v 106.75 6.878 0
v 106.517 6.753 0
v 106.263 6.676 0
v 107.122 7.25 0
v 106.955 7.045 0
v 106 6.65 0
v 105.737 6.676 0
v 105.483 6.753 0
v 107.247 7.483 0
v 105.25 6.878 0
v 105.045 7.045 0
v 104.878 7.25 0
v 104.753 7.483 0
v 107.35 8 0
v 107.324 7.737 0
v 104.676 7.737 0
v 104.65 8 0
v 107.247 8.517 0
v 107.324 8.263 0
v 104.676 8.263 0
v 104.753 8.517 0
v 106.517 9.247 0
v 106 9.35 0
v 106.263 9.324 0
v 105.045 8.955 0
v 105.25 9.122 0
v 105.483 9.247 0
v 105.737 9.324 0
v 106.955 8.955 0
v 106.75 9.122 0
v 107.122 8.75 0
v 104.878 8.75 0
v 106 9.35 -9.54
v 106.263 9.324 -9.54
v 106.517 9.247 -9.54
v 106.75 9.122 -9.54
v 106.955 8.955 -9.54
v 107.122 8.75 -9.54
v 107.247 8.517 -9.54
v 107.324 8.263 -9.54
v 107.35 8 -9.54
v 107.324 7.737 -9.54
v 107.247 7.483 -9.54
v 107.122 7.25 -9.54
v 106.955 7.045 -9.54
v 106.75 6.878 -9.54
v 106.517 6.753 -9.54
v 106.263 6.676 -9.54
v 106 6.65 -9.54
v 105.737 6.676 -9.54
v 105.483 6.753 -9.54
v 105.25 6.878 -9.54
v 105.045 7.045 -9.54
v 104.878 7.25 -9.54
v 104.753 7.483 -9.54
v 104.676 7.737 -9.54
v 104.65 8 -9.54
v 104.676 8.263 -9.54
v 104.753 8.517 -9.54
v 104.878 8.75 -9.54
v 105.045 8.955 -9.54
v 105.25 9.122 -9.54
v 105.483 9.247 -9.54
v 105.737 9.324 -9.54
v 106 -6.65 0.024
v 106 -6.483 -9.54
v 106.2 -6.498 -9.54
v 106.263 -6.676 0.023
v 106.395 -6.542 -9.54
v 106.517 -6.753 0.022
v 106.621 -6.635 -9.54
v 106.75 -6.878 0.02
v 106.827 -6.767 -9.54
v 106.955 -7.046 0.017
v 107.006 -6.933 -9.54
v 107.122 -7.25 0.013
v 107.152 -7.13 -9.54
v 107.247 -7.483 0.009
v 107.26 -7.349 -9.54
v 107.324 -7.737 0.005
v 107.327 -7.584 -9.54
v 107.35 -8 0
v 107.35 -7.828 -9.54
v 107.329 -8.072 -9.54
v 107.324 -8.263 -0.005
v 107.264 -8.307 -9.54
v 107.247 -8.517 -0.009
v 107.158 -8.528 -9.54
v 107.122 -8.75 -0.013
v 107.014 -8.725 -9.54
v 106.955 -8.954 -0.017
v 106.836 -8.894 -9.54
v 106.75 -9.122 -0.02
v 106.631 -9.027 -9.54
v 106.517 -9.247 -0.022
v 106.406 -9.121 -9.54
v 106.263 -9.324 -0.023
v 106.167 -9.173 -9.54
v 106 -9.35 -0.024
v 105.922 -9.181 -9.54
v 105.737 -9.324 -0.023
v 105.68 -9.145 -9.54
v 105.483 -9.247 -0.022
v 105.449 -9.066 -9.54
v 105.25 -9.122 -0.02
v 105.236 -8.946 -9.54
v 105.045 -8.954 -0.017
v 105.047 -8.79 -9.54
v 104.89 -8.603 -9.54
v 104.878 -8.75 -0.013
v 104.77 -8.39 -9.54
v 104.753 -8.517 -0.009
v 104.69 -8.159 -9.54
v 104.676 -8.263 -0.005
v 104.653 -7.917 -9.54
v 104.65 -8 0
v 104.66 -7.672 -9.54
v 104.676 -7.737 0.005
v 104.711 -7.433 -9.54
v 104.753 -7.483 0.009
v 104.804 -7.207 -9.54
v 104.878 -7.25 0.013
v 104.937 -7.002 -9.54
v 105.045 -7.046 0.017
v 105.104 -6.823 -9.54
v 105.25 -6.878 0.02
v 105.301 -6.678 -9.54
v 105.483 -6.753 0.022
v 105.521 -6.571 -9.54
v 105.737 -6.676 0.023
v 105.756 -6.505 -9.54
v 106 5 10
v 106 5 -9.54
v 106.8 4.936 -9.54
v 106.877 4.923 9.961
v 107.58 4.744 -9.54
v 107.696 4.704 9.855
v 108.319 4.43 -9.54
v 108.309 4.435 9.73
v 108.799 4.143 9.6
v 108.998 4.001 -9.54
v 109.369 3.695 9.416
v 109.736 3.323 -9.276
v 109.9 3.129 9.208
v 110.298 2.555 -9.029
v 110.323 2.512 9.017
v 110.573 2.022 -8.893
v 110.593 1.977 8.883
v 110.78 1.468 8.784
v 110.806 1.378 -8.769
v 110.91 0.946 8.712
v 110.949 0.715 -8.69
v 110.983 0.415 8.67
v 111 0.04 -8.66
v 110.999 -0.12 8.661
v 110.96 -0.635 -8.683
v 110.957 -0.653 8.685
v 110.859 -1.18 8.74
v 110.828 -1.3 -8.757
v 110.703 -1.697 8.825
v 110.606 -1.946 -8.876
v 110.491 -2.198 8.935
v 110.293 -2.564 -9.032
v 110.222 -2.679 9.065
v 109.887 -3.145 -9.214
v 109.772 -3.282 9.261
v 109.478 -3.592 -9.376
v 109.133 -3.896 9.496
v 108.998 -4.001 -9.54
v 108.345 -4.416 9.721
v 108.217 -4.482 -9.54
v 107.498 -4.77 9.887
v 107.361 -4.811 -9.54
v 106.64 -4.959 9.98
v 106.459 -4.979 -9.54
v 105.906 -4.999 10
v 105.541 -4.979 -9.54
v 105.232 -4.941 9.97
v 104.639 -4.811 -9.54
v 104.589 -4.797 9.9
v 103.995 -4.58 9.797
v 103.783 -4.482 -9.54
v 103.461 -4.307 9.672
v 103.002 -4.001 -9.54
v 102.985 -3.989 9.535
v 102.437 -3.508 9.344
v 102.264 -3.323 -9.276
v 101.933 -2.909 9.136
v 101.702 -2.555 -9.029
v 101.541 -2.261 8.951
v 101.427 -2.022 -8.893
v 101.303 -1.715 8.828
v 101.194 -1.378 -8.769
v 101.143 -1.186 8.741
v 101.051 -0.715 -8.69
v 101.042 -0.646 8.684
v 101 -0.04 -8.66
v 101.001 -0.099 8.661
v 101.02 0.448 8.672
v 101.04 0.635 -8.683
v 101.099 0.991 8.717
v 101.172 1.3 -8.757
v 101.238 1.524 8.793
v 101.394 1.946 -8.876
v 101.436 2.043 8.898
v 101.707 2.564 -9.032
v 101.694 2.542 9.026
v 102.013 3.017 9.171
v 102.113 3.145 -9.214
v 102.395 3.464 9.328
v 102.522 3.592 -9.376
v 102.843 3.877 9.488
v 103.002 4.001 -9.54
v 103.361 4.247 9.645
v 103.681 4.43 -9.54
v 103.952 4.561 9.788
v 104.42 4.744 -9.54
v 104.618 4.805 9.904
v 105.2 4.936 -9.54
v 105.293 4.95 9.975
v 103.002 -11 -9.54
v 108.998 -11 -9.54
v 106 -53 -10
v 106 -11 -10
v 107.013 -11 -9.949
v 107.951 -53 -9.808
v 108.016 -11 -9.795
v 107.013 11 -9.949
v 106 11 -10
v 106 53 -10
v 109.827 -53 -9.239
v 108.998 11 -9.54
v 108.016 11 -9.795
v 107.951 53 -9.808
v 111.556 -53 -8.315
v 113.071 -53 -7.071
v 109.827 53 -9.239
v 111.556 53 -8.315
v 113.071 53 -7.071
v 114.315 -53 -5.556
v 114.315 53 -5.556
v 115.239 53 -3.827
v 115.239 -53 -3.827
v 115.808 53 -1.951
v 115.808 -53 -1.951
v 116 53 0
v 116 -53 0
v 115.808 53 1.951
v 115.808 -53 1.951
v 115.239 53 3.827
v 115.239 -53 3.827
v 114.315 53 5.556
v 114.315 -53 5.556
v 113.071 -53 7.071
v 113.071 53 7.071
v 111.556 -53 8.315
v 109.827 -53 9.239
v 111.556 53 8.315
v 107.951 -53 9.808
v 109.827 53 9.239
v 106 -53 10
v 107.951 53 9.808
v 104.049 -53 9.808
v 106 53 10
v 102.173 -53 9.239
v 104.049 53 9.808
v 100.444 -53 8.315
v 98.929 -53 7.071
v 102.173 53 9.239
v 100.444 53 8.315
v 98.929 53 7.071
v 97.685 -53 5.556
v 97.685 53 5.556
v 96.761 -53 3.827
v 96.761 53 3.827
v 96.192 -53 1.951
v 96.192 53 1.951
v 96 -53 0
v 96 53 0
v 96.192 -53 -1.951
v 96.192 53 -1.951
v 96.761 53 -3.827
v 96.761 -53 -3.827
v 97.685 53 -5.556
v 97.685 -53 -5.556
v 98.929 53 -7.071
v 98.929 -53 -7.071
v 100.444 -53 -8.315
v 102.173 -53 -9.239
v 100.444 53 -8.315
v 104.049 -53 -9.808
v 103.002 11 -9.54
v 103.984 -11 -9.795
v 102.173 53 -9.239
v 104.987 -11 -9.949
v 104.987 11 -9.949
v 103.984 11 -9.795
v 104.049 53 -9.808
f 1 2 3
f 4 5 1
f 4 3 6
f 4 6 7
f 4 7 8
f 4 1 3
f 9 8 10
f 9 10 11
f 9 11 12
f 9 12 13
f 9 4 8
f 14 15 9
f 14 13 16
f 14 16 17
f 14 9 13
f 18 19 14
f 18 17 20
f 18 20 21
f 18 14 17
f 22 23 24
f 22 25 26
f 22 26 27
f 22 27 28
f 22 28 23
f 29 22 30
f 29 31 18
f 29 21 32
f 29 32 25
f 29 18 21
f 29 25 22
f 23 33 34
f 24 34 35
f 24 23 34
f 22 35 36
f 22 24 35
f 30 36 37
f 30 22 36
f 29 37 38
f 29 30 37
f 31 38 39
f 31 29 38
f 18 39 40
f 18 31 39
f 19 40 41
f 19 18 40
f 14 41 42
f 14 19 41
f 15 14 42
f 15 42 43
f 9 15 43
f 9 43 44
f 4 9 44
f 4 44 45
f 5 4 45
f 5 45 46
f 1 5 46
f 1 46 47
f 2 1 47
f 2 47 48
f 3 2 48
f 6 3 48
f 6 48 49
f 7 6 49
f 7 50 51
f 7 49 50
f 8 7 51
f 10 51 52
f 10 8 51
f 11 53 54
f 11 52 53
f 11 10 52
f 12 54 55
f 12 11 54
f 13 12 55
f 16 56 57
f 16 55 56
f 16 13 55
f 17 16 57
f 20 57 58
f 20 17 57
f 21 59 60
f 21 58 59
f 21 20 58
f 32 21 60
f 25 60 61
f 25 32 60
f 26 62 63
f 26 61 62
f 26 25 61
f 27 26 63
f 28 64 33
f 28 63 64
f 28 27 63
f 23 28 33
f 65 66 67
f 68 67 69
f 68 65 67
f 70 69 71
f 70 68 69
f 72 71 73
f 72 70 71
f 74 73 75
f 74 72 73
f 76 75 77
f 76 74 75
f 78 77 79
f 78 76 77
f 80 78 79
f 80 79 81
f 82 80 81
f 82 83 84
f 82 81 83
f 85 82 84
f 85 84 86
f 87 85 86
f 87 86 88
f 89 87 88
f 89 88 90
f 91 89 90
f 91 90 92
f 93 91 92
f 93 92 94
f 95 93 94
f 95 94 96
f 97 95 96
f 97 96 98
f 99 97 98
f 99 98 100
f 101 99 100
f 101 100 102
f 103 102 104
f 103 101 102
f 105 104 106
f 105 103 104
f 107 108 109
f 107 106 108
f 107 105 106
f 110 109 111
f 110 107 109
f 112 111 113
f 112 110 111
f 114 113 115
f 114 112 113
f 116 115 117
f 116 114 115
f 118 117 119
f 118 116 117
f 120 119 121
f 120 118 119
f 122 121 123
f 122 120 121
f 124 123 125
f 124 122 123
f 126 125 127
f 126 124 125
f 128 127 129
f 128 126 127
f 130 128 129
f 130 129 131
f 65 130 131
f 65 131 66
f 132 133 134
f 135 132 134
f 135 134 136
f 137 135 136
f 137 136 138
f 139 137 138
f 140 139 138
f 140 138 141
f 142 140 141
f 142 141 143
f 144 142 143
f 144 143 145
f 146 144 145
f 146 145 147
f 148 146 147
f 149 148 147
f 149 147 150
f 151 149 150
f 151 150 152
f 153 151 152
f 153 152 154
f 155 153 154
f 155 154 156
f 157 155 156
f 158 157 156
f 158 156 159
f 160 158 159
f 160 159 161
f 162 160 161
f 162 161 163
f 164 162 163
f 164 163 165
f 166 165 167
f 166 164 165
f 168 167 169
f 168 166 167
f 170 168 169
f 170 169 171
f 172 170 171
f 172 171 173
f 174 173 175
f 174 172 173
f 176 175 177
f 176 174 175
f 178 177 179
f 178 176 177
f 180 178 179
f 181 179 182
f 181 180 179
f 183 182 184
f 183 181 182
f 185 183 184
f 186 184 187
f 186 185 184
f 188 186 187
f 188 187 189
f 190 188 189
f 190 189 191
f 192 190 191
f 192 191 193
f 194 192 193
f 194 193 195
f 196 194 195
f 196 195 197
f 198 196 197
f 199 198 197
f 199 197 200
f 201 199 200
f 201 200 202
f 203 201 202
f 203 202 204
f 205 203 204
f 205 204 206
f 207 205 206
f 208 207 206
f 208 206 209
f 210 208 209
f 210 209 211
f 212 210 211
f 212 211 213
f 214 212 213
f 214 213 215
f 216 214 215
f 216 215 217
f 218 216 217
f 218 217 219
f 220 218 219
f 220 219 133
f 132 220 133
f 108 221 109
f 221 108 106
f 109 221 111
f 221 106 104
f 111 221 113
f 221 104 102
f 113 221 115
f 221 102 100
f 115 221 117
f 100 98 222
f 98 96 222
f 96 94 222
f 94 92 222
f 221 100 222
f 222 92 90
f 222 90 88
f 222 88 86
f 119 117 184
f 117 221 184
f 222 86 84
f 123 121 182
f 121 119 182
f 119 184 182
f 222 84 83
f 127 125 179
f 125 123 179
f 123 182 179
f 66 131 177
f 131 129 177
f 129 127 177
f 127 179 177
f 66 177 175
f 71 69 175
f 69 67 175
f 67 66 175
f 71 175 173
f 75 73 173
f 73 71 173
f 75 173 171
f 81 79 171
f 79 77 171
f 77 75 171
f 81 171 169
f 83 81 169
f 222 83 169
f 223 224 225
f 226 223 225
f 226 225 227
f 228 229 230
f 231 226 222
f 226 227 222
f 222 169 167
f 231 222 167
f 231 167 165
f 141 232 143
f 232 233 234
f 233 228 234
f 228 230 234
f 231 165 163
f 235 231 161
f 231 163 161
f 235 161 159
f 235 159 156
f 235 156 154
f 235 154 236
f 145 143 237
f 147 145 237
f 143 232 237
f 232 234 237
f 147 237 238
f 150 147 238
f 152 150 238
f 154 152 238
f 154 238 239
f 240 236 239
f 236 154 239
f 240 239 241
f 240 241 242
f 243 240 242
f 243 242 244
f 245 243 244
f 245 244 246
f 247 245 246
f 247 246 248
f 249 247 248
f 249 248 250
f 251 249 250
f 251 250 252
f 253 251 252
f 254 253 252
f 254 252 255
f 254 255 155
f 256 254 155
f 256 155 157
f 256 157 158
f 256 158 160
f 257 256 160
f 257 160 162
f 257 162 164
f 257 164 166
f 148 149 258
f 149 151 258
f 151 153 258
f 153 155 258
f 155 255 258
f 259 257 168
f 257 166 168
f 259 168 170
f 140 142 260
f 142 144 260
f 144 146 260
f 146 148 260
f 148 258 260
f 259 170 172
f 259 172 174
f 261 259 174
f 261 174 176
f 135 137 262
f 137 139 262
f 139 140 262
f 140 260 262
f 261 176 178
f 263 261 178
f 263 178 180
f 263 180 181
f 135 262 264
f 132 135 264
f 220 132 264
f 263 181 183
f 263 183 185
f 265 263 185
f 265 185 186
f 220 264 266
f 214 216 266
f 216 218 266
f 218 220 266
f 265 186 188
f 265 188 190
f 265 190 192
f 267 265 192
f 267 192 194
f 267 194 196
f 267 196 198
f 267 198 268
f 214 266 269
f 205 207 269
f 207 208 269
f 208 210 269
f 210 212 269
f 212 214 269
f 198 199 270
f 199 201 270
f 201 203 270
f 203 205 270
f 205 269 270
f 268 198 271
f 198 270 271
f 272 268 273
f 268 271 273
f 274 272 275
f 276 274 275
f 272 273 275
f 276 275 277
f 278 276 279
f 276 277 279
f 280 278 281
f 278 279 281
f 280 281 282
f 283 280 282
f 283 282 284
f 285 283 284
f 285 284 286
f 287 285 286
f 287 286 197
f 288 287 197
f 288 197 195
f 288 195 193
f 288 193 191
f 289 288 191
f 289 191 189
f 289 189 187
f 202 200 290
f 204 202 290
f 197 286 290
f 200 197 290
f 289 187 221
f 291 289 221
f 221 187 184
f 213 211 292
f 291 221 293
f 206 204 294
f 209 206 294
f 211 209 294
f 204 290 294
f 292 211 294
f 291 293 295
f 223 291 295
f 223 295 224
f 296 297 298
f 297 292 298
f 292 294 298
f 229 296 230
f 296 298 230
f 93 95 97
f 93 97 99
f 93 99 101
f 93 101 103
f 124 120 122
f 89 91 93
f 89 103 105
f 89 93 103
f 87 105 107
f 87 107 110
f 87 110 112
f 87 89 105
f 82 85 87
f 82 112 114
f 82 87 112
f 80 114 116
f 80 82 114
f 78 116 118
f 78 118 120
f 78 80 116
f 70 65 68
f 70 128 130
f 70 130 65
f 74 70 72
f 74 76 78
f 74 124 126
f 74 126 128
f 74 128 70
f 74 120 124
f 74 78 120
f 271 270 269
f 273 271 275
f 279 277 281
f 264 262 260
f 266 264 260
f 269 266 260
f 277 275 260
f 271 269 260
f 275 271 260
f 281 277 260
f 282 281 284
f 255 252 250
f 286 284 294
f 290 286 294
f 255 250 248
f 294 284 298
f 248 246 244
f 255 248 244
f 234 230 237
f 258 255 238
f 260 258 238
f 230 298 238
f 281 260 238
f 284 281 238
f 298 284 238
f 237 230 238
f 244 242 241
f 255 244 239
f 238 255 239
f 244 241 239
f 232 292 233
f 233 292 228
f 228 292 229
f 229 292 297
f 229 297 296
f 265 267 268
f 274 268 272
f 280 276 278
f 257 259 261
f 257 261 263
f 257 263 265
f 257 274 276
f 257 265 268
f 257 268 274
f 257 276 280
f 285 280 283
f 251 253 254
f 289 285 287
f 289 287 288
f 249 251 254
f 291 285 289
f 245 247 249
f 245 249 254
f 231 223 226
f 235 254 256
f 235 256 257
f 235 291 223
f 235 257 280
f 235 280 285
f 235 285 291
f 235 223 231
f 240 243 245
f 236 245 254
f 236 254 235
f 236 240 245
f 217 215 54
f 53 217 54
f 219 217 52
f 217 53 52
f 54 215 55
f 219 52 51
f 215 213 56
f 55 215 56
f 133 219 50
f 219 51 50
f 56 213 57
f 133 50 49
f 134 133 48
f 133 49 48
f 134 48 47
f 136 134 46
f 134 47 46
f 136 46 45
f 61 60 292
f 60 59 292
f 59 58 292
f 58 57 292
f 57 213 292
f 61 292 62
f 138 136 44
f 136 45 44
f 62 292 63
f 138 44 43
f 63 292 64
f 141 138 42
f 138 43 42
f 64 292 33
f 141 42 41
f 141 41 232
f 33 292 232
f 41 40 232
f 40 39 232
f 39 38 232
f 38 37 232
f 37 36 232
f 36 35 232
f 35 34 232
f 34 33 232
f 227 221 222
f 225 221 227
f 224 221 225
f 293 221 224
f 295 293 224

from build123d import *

# Parameters (mm, degrees)
CYLINDER004_R               = 1.35
CYLINDER004_DEPTH           = 10
CYLINDER004_PLACEMENT_ANGLE = 91
CYLINDER003_R               = 1.35
CYLINDER003_DEPTH           = 10
CYLINDER003_PITCH_ANGLE     = 90
CYLINDER002_R               = 5
CYLINDER002_DEPTH           = 20
CYLINDER002_PITCH_ANGLE     = 90
BOX_W                       = 10
BOX_H                       = 6
BOX_DEPTH                   = 22
CYLINDER001_R               = 10
CYLINDER001_DEPTH           = 106
CUT003_PITCH_ANGLE          = 90
CUT003_PLACEMENT_ANGLE      = -90


with BuildPart() as cylinder004:
    # Cylinder004 → Cylinder004 (new body)
    with BuildSketch(Plane.XY):
        Circle(CYLINDER004_R)
    extrude(amount=CYLINDER004_DEPTH)


with BuildPart() as cylinder004_1:
    # Cylinder004 placement: moved
    add(cylinder004.part.moved(Location((0, 0, 85))).rotate(Axis((0, 0, 85), (0, 1, 0)), CYLINDER004_PLACEMENT_ANGLE))


with BuildPart() as cylinder003:
    # Cylinder003 → Cylinder003 (new body)
    with BuildSketch(Plane.XY):
        Circle(CYLINDER003_R)
    extrude(amount=CYLINDER003_DEPTH)


with BuildPart() as cylinder003_1:
    # Cylinder003 pitch: moved
    add(cylinder003.part.rotate(Axis((0, 0, 0), (0, 1, 0)), CYLINDER003_PITCH_ANGLE))


with BuildPart() as cylinder003_2:
    # Cylinder003 placement: moved
    add(cylinder003_1.part.moved(Location((0, 0, 69))))


with BuildPart() as cylinder002:
    # Cylinder002 → Cylinder002 (new body)
    with BuildSketch(Plane.XY):
        Circle(CYLINDER002_R)
    extrude(amount=CYLINDER002_DEPTH)


with BuildPart() as cylinder002_1:
    # Cylinder002 pitch: moved
    add(cylinder002.part.rotate(Axis((0, 0, 0), (0, 1, 0)), CYLINDER002_PITCH_ANGLE))


with BuildPart() as cylinder002_2:
    # Cylinder002 placement: moved
    add(cylinder002_1.part.moved(Location((-10, 0, 77))))


with BuildPart() as cube:
    # Box → Box (new body)
    with BuildSketch(Plane(origin=(9.54, -3, 66), x_dir=(1, 0, 0), z_dir=(0, 0, 1))):
        with Locations((5, 3)):
            Rectangle(BOX_W, BOX_H)
    extrude(amount=BOX_DEPTH)


with BuildPart() as lever:
    # Cylinder001 → Cylinder001 (new body)
    with BuildSketch(Plane.XY.offset(24)):
        Circle(CYLINDER001_R)
    extrude(amount=CYLINDER001_DEPTH)

    # Cut: cut Cube
    add(cube.part, mode=Mode.SUBTRACT)

    # Cut001: cut Cylinder002
    add(cylinder002_2.part, mode=Mode.SUBTRACT)

    # Cut002: cut Cylinder003
    add(cylinder003_2.part, mode=Mode.SUBTRACT)

    # Cut003: cut Cylinder004
    add(cylinder004_1.part, mode=Mode.SUBTRACT)


with BuildPart() as lever_1:
    # Cut003 pitch: moved
    add(lever.part.rotate(Axis((0, 0, 0), (0, 1, 0)), CUT003_PITCH_ANGLE))


with BuildPart() as lever_2:
    # Cut003 placement: moved
    add(lever_1.part.moved(Location((106, 77, 0))).rotate(Axis((106, 77, 0), (0, 0, 1)), CUT003_PLACEMENT_ANGLE))


solid = lever_2.part
